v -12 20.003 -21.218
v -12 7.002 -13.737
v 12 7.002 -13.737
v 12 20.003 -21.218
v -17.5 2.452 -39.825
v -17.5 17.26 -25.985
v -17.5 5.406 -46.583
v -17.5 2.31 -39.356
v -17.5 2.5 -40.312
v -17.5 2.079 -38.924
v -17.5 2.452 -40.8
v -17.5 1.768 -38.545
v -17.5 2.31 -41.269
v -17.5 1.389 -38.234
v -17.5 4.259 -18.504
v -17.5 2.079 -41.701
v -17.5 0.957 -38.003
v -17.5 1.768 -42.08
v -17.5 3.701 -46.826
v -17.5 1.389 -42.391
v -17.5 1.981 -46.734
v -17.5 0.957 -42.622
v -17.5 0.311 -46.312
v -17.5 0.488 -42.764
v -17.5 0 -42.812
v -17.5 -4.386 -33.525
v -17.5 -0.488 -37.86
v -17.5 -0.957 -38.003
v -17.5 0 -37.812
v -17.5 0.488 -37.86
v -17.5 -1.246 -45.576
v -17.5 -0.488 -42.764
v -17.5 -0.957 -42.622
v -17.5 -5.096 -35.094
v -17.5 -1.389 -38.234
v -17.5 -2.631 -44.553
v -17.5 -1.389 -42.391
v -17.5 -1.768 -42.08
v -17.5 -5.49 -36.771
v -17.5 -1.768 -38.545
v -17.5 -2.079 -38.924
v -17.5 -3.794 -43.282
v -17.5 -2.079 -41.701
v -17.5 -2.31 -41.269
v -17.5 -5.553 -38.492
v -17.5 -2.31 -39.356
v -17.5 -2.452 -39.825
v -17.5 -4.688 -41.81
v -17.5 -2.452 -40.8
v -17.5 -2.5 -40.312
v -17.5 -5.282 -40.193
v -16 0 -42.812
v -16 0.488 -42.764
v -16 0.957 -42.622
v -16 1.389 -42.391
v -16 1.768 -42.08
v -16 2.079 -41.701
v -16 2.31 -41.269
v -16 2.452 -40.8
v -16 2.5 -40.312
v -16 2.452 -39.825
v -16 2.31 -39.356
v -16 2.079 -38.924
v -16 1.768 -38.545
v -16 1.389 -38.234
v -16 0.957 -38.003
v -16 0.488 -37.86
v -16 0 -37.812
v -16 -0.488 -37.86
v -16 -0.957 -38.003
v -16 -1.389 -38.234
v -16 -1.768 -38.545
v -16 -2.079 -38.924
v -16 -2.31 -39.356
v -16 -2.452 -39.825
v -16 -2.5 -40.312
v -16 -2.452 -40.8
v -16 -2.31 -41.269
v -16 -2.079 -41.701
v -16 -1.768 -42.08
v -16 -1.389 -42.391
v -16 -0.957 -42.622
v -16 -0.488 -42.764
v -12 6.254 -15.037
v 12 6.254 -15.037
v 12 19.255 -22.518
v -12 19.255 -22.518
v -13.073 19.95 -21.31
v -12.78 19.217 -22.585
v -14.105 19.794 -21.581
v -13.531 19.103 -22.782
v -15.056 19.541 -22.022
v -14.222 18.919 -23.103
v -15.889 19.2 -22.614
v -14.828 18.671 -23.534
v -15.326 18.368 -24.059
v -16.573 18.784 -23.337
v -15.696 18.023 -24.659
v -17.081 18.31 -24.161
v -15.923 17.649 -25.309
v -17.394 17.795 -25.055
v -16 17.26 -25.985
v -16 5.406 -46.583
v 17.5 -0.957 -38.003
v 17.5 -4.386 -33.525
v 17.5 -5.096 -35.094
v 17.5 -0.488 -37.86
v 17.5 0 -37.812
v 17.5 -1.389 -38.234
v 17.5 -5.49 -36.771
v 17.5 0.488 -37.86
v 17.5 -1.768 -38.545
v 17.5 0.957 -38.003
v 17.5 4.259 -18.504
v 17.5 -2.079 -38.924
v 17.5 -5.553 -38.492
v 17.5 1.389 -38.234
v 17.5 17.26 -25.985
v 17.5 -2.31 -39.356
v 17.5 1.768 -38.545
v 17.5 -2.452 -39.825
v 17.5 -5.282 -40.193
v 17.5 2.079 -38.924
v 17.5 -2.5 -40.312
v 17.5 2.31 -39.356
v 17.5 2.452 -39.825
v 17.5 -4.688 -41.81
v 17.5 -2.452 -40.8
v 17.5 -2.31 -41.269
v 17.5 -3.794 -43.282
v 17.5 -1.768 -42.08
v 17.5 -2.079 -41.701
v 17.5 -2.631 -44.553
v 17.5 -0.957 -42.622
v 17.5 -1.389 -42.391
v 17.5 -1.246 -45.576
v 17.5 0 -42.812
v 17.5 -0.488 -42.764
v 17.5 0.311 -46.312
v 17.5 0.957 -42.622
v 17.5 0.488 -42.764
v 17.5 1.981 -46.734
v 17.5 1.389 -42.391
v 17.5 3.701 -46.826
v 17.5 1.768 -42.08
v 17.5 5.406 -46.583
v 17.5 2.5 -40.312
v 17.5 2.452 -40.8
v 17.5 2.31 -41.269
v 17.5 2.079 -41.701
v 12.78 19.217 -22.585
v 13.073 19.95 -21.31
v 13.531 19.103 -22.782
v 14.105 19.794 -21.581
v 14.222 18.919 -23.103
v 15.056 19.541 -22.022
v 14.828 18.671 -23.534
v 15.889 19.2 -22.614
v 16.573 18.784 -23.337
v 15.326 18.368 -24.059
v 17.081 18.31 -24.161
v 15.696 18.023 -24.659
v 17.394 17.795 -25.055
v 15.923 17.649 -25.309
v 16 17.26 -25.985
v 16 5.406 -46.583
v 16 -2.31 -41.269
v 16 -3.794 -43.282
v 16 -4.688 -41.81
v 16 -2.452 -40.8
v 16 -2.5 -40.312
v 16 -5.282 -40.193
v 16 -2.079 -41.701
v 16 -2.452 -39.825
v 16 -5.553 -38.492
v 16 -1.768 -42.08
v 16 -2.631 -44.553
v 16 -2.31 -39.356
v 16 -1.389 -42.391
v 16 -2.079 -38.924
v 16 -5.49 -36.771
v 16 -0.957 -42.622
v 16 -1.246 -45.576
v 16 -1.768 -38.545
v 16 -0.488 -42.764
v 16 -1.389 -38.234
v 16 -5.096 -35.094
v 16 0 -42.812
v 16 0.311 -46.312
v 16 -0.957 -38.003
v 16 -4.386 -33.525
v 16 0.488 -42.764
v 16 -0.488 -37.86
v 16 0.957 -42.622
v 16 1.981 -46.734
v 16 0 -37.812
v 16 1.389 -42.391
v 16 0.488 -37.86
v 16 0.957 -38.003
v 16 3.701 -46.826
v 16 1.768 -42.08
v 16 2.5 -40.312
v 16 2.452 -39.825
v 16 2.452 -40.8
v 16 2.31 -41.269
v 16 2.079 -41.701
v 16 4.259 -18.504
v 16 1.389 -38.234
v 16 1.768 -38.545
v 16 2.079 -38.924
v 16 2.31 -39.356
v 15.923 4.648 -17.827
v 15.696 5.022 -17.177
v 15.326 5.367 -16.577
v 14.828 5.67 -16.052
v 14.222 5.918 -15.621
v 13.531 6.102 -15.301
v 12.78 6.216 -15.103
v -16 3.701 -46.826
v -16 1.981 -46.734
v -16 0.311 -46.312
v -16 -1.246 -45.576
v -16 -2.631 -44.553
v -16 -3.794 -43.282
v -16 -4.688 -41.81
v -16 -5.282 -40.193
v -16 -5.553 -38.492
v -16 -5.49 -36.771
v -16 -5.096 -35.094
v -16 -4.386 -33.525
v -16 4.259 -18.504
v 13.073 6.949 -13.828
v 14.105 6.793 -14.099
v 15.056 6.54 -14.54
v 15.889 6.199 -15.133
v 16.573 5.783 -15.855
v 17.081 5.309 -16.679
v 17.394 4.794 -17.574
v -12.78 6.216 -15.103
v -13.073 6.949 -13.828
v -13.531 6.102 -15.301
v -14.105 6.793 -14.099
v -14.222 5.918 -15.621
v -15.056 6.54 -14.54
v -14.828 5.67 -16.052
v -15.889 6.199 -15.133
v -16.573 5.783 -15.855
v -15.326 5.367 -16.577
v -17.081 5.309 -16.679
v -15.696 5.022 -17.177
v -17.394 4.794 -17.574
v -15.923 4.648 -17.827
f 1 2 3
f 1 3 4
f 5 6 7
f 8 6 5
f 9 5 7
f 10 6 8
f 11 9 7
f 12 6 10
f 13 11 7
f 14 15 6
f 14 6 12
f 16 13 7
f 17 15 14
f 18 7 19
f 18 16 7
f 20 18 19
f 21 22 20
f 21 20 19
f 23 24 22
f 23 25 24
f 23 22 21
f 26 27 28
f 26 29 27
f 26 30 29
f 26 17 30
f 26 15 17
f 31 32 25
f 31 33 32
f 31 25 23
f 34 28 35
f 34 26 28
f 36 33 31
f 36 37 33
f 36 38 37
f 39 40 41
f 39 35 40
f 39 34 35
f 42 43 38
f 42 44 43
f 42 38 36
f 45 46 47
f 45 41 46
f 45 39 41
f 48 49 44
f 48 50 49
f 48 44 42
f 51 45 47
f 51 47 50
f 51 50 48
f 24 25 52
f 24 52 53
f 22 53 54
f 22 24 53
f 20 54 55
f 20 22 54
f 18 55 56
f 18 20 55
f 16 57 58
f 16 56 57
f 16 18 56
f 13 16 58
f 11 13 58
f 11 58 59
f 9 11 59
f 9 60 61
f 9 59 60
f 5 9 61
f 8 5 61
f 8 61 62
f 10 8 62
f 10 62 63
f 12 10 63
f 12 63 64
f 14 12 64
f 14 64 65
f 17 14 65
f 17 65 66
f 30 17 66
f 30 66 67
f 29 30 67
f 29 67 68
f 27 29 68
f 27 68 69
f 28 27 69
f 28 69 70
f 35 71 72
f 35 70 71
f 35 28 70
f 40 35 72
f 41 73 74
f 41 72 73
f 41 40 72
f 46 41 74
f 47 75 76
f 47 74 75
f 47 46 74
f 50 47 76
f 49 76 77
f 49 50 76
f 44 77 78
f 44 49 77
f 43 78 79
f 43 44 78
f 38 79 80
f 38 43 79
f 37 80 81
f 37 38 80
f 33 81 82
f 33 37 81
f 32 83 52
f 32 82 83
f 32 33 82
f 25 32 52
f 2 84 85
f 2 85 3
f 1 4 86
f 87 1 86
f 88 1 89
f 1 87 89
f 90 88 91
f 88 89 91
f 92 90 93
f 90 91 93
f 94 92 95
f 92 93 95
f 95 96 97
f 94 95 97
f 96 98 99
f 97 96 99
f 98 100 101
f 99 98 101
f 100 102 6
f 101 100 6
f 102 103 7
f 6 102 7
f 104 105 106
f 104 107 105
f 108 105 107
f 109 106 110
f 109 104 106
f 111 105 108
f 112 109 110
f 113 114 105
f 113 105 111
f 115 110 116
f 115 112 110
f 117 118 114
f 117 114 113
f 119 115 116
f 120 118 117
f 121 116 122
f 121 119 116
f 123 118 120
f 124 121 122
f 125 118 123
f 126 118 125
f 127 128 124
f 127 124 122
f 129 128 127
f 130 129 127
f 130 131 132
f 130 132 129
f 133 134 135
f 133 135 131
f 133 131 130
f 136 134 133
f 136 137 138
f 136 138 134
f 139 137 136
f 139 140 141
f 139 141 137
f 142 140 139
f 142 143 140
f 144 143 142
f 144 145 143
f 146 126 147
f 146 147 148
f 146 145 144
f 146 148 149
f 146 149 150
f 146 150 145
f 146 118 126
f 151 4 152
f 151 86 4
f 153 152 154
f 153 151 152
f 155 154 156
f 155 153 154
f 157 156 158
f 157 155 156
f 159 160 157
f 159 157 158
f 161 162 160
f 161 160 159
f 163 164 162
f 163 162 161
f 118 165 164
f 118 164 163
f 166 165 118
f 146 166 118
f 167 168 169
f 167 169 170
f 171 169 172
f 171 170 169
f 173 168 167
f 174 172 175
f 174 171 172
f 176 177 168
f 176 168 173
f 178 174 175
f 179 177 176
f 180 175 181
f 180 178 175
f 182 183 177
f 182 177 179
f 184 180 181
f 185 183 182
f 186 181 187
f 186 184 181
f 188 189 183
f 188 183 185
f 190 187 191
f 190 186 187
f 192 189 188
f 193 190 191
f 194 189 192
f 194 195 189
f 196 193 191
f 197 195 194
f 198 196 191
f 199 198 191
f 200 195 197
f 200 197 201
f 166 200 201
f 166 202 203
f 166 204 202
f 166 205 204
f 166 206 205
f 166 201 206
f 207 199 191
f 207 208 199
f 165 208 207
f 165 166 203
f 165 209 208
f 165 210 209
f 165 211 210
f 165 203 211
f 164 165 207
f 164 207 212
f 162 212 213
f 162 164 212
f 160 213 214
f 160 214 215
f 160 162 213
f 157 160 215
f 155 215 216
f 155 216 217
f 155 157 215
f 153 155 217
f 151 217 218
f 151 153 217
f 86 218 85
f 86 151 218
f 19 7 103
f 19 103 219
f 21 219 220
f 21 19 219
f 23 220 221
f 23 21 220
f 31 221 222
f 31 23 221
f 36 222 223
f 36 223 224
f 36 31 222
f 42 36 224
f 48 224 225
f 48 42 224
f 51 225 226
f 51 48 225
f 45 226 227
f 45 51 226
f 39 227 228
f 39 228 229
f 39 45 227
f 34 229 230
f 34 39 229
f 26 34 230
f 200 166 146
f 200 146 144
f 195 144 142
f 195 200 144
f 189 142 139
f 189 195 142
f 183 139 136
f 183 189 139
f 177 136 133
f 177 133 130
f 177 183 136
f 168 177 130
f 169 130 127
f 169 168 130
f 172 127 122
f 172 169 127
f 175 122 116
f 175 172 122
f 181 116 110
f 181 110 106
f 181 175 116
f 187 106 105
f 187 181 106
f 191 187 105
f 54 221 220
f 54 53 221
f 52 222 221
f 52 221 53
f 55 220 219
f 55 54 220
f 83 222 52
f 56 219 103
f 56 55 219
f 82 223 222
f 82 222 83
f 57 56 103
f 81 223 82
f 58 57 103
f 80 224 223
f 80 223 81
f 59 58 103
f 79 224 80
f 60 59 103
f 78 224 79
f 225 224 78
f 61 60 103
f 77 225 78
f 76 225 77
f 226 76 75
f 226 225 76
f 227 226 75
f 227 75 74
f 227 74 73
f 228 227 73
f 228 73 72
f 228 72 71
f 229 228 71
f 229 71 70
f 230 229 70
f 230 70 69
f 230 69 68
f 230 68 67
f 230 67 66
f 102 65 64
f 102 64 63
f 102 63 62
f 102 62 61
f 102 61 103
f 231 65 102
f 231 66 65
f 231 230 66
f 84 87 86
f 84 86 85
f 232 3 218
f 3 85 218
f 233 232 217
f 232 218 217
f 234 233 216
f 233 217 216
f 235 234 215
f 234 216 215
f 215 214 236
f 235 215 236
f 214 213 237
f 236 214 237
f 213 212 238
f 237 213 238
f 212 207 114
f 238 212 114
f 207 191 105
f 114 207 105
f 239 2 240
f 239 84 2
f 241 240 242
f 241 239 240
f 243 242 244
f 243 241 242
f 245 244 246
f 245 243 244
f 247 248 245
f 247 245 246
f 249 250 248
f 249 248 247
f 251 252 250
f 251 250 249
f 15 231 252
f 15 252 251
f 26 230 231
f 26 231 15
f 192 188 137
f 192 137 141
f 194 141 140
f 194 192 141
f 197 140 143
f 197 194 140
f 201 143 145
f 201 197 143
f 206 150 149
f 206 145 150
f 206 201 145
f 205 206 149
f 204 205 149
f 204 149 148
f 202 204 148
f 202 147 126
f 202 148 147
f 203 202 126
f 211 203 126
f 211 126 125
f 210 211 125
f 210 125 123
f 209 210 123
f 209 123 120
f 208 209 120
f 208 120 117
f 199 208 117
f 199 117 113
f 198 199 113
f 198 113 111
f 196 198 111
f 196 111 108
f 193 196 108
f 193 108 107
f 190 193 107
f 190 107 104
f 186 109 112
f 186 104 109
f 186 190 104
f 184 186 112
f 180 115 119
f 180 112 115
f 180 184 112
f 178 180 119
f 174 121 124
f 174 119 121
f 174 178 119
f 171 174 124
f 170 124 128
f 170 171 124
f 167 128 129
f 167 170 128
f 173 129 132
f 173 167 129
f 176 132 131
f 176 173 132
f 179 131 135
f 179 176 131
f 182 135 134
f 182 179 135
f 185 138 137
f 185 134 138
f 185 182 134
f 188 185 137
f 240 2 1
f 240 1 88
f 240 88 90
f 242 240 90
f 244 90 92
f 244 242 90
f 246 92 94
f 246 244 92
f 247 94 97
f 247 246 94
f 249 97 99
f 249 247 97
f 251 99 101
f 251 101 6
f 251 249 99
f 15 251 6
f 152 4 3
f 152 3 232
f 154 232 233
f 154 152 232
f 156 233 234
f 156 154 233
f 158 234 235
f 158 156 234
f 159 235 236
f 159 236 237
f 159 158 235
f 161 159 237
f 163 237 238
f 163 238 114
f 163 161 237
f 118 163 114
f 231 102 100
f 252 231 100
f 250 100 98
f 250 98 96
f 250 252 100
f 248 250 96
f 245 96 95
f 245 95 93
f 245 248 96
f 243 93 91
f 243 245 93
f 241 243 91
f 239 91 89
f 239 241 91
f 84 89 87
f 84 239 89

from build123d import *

# Parameters (mm, degrees)
BOSS_EXTRUDE1_DEPTH            = 16
BOSS_EXTRUDE1_DEPTH_BACK       = 16
EDGE_FLANGE1_STRIP_W           = 14
EDGE_FLANGE1_STRIP_H           = 1.5
EDGE_FLANGE1_STRIP_CUT_DEPTH   = 15
EDGE_FLANGE1_STRIP_2_W         = 14
EDGE_FLANGE1_STRIP_2_H         = 1.5
EDGE_FLANGE1_STRIP_CUT_2_DEPTH = 15
EDGE_FLANGE1_DEPTH             = 15
EDGE_FLANGE1_BEND_DEPTH        = 15
CUT_EXTRUDE1_DEPTH             = 70.261521918
CUT_EXTRUDE1_DEPTH_BACK        = 70.261521918
SKETCH12_R                     = 2.5


# Sheet-metal steps are written as plain solids
with BuildPart() as part:
    # Sketch1 → Boss-Extrude1 (new, two sides: drawn at the far end of the back side and taken through both)
    with BuildSketch(Plane(origin=(0, 0, 0), x_dir=(0, 0, -1), z_dir=(1, 0, 0)).offset(-BOSS_EXTRUDE1_DEPTH_BACK)):
        Polygon((13.736581906, 7.002159097), (21.218242798, 20.003110997), (22.518337988, 19.254944908), (15.036677096, 6.253993008), align=None)
    extrude(amount=BOSS_EXTRUDE1_DEPTH + BOSS_EXTRUDE1_DEPTH_BACK)

    # Edge-Flange1 strip (across the edge) → Edge-Flange1 strip cut (cut)
    with BuildSketch(Plane(origin=(16, 19.254944908, -22.518337988), x_dir=(-1, 0, 0), z_dir=(0, -0.8667301266485011, 0.498777392791487))):
        with Locations((-3, -0.75)):
            Rectangle(EDGE_FLANGE1_STRIP_W, EDGE_FLANGE1_STRIP_H)
    extrude(amount=EDGE_FLANGE1_STRIP_CUT_DEPTH, mode=Mode.SUBTRACT)

    # Edge-Flange1 strip 2 (across the edge) → Edge-Flange1 strip cut 2 (cut)
    with BuildSketch(Plane(origin=(-16, 6.253993008, -15.036677096), x_dir=(1, 0, 0), z_dir=(0, 0.8667301266485011, -0.498777392791487))):
        with Locations((-3, -0.75)):
            Rectangle(EDGE_FLANGE1_STRIP_2_W, EDGE_FLANGE1_STRIP_2_H)
    extrude(amount=EDGE_FLANGE1_STRIP_CUT_2_DEPTH, mode=Mode.SUBTRACT)

    # Edge-Flange1 section (across the edge) → Edge-Flange1 (add)
    with BuildSketch(Plane(origin=(16, 19.254944908, -22.518337988), x_dir=(-1, 0, 0), z_dir=(0, -0.8667301266485011, 0.498777392791487))):
        with BuildLine():
            Line((-1.5, 4), (-1.5, 39))
            Line((-1.5, 39), (0, 39))
            Line((0, 39), (0, 4))
            ThreePointArc((0, 4), (1.171572875, 1.171572875), (4, 0))
            Line((4, 0), (4, -1.5))
            ThreePointArc((4, -1.5), (0.110912703, 0.110912703), (-1.5, 4))
        make_face()
    extrude(amount=EDGE_FLANGE1_DEPTH)

    # Edge-Flange1 section 2 (across the edge) → Edge-Flange1 bend (add)
    with BuildSketch(Plane(origin=(-16, 6.253993008, -15.036677096), x_dir=(1, 0, 0), z_dir=(0, 0.8667301266485011, -0.498777392791487))):
        with BuildLine():
            Line((-1.5, 4), (-1.5, 39))
            Line((-1.5, 39), (0, 39))
            Line((0, 39), (0, 4))
            ThreePointArc((0, 4), (1.171572875, 1.171572875), (4, 0))
            Line((4, 0), (4, -1.5))
            ThreePointArc((4, -1.5), (0.110912703, 0.110912703), (-1.5, 4))
        make_face()
    extrude(amount=EDGE_FLANGE1_BEND_DEPTH)

    # Sketch12 → Cut-Extrude1 (cut, two sides: drawn at the far end of the back side and taken through both)
    with BuildSketch(Plane(origin=(17.5, 0, 0), x_dir=(0, 0, -1), z_dir=(1, 0, 0)).offset(-CUT_EXTRUDE1_DEPTH_BACK)):
        with Locations((40.312429407, 0)):
            Circle(SKETCH12_R)
        with BuildLine():
            Line((33.525218207, -4.385612156), (48.839152035, -13.198325311))
            Line((48.839152035, -13.198325311), (56.320812927, -0.197373411))
            Line((56.320812927, -0.197373411), (46.583424145, 5.406204035))
            ThreePointArc((46.583424145, 5.406204035), (43.281589749, -3.793536651), (33.525218207, -4.385612156))
        make_face()
    extrude(amount=CUT_EXTRUDE1_DEPTH + CUT_EXTRUDE1_DEPTH_BACK, mode=Mode.SUBTRACT)


solid = part.part
